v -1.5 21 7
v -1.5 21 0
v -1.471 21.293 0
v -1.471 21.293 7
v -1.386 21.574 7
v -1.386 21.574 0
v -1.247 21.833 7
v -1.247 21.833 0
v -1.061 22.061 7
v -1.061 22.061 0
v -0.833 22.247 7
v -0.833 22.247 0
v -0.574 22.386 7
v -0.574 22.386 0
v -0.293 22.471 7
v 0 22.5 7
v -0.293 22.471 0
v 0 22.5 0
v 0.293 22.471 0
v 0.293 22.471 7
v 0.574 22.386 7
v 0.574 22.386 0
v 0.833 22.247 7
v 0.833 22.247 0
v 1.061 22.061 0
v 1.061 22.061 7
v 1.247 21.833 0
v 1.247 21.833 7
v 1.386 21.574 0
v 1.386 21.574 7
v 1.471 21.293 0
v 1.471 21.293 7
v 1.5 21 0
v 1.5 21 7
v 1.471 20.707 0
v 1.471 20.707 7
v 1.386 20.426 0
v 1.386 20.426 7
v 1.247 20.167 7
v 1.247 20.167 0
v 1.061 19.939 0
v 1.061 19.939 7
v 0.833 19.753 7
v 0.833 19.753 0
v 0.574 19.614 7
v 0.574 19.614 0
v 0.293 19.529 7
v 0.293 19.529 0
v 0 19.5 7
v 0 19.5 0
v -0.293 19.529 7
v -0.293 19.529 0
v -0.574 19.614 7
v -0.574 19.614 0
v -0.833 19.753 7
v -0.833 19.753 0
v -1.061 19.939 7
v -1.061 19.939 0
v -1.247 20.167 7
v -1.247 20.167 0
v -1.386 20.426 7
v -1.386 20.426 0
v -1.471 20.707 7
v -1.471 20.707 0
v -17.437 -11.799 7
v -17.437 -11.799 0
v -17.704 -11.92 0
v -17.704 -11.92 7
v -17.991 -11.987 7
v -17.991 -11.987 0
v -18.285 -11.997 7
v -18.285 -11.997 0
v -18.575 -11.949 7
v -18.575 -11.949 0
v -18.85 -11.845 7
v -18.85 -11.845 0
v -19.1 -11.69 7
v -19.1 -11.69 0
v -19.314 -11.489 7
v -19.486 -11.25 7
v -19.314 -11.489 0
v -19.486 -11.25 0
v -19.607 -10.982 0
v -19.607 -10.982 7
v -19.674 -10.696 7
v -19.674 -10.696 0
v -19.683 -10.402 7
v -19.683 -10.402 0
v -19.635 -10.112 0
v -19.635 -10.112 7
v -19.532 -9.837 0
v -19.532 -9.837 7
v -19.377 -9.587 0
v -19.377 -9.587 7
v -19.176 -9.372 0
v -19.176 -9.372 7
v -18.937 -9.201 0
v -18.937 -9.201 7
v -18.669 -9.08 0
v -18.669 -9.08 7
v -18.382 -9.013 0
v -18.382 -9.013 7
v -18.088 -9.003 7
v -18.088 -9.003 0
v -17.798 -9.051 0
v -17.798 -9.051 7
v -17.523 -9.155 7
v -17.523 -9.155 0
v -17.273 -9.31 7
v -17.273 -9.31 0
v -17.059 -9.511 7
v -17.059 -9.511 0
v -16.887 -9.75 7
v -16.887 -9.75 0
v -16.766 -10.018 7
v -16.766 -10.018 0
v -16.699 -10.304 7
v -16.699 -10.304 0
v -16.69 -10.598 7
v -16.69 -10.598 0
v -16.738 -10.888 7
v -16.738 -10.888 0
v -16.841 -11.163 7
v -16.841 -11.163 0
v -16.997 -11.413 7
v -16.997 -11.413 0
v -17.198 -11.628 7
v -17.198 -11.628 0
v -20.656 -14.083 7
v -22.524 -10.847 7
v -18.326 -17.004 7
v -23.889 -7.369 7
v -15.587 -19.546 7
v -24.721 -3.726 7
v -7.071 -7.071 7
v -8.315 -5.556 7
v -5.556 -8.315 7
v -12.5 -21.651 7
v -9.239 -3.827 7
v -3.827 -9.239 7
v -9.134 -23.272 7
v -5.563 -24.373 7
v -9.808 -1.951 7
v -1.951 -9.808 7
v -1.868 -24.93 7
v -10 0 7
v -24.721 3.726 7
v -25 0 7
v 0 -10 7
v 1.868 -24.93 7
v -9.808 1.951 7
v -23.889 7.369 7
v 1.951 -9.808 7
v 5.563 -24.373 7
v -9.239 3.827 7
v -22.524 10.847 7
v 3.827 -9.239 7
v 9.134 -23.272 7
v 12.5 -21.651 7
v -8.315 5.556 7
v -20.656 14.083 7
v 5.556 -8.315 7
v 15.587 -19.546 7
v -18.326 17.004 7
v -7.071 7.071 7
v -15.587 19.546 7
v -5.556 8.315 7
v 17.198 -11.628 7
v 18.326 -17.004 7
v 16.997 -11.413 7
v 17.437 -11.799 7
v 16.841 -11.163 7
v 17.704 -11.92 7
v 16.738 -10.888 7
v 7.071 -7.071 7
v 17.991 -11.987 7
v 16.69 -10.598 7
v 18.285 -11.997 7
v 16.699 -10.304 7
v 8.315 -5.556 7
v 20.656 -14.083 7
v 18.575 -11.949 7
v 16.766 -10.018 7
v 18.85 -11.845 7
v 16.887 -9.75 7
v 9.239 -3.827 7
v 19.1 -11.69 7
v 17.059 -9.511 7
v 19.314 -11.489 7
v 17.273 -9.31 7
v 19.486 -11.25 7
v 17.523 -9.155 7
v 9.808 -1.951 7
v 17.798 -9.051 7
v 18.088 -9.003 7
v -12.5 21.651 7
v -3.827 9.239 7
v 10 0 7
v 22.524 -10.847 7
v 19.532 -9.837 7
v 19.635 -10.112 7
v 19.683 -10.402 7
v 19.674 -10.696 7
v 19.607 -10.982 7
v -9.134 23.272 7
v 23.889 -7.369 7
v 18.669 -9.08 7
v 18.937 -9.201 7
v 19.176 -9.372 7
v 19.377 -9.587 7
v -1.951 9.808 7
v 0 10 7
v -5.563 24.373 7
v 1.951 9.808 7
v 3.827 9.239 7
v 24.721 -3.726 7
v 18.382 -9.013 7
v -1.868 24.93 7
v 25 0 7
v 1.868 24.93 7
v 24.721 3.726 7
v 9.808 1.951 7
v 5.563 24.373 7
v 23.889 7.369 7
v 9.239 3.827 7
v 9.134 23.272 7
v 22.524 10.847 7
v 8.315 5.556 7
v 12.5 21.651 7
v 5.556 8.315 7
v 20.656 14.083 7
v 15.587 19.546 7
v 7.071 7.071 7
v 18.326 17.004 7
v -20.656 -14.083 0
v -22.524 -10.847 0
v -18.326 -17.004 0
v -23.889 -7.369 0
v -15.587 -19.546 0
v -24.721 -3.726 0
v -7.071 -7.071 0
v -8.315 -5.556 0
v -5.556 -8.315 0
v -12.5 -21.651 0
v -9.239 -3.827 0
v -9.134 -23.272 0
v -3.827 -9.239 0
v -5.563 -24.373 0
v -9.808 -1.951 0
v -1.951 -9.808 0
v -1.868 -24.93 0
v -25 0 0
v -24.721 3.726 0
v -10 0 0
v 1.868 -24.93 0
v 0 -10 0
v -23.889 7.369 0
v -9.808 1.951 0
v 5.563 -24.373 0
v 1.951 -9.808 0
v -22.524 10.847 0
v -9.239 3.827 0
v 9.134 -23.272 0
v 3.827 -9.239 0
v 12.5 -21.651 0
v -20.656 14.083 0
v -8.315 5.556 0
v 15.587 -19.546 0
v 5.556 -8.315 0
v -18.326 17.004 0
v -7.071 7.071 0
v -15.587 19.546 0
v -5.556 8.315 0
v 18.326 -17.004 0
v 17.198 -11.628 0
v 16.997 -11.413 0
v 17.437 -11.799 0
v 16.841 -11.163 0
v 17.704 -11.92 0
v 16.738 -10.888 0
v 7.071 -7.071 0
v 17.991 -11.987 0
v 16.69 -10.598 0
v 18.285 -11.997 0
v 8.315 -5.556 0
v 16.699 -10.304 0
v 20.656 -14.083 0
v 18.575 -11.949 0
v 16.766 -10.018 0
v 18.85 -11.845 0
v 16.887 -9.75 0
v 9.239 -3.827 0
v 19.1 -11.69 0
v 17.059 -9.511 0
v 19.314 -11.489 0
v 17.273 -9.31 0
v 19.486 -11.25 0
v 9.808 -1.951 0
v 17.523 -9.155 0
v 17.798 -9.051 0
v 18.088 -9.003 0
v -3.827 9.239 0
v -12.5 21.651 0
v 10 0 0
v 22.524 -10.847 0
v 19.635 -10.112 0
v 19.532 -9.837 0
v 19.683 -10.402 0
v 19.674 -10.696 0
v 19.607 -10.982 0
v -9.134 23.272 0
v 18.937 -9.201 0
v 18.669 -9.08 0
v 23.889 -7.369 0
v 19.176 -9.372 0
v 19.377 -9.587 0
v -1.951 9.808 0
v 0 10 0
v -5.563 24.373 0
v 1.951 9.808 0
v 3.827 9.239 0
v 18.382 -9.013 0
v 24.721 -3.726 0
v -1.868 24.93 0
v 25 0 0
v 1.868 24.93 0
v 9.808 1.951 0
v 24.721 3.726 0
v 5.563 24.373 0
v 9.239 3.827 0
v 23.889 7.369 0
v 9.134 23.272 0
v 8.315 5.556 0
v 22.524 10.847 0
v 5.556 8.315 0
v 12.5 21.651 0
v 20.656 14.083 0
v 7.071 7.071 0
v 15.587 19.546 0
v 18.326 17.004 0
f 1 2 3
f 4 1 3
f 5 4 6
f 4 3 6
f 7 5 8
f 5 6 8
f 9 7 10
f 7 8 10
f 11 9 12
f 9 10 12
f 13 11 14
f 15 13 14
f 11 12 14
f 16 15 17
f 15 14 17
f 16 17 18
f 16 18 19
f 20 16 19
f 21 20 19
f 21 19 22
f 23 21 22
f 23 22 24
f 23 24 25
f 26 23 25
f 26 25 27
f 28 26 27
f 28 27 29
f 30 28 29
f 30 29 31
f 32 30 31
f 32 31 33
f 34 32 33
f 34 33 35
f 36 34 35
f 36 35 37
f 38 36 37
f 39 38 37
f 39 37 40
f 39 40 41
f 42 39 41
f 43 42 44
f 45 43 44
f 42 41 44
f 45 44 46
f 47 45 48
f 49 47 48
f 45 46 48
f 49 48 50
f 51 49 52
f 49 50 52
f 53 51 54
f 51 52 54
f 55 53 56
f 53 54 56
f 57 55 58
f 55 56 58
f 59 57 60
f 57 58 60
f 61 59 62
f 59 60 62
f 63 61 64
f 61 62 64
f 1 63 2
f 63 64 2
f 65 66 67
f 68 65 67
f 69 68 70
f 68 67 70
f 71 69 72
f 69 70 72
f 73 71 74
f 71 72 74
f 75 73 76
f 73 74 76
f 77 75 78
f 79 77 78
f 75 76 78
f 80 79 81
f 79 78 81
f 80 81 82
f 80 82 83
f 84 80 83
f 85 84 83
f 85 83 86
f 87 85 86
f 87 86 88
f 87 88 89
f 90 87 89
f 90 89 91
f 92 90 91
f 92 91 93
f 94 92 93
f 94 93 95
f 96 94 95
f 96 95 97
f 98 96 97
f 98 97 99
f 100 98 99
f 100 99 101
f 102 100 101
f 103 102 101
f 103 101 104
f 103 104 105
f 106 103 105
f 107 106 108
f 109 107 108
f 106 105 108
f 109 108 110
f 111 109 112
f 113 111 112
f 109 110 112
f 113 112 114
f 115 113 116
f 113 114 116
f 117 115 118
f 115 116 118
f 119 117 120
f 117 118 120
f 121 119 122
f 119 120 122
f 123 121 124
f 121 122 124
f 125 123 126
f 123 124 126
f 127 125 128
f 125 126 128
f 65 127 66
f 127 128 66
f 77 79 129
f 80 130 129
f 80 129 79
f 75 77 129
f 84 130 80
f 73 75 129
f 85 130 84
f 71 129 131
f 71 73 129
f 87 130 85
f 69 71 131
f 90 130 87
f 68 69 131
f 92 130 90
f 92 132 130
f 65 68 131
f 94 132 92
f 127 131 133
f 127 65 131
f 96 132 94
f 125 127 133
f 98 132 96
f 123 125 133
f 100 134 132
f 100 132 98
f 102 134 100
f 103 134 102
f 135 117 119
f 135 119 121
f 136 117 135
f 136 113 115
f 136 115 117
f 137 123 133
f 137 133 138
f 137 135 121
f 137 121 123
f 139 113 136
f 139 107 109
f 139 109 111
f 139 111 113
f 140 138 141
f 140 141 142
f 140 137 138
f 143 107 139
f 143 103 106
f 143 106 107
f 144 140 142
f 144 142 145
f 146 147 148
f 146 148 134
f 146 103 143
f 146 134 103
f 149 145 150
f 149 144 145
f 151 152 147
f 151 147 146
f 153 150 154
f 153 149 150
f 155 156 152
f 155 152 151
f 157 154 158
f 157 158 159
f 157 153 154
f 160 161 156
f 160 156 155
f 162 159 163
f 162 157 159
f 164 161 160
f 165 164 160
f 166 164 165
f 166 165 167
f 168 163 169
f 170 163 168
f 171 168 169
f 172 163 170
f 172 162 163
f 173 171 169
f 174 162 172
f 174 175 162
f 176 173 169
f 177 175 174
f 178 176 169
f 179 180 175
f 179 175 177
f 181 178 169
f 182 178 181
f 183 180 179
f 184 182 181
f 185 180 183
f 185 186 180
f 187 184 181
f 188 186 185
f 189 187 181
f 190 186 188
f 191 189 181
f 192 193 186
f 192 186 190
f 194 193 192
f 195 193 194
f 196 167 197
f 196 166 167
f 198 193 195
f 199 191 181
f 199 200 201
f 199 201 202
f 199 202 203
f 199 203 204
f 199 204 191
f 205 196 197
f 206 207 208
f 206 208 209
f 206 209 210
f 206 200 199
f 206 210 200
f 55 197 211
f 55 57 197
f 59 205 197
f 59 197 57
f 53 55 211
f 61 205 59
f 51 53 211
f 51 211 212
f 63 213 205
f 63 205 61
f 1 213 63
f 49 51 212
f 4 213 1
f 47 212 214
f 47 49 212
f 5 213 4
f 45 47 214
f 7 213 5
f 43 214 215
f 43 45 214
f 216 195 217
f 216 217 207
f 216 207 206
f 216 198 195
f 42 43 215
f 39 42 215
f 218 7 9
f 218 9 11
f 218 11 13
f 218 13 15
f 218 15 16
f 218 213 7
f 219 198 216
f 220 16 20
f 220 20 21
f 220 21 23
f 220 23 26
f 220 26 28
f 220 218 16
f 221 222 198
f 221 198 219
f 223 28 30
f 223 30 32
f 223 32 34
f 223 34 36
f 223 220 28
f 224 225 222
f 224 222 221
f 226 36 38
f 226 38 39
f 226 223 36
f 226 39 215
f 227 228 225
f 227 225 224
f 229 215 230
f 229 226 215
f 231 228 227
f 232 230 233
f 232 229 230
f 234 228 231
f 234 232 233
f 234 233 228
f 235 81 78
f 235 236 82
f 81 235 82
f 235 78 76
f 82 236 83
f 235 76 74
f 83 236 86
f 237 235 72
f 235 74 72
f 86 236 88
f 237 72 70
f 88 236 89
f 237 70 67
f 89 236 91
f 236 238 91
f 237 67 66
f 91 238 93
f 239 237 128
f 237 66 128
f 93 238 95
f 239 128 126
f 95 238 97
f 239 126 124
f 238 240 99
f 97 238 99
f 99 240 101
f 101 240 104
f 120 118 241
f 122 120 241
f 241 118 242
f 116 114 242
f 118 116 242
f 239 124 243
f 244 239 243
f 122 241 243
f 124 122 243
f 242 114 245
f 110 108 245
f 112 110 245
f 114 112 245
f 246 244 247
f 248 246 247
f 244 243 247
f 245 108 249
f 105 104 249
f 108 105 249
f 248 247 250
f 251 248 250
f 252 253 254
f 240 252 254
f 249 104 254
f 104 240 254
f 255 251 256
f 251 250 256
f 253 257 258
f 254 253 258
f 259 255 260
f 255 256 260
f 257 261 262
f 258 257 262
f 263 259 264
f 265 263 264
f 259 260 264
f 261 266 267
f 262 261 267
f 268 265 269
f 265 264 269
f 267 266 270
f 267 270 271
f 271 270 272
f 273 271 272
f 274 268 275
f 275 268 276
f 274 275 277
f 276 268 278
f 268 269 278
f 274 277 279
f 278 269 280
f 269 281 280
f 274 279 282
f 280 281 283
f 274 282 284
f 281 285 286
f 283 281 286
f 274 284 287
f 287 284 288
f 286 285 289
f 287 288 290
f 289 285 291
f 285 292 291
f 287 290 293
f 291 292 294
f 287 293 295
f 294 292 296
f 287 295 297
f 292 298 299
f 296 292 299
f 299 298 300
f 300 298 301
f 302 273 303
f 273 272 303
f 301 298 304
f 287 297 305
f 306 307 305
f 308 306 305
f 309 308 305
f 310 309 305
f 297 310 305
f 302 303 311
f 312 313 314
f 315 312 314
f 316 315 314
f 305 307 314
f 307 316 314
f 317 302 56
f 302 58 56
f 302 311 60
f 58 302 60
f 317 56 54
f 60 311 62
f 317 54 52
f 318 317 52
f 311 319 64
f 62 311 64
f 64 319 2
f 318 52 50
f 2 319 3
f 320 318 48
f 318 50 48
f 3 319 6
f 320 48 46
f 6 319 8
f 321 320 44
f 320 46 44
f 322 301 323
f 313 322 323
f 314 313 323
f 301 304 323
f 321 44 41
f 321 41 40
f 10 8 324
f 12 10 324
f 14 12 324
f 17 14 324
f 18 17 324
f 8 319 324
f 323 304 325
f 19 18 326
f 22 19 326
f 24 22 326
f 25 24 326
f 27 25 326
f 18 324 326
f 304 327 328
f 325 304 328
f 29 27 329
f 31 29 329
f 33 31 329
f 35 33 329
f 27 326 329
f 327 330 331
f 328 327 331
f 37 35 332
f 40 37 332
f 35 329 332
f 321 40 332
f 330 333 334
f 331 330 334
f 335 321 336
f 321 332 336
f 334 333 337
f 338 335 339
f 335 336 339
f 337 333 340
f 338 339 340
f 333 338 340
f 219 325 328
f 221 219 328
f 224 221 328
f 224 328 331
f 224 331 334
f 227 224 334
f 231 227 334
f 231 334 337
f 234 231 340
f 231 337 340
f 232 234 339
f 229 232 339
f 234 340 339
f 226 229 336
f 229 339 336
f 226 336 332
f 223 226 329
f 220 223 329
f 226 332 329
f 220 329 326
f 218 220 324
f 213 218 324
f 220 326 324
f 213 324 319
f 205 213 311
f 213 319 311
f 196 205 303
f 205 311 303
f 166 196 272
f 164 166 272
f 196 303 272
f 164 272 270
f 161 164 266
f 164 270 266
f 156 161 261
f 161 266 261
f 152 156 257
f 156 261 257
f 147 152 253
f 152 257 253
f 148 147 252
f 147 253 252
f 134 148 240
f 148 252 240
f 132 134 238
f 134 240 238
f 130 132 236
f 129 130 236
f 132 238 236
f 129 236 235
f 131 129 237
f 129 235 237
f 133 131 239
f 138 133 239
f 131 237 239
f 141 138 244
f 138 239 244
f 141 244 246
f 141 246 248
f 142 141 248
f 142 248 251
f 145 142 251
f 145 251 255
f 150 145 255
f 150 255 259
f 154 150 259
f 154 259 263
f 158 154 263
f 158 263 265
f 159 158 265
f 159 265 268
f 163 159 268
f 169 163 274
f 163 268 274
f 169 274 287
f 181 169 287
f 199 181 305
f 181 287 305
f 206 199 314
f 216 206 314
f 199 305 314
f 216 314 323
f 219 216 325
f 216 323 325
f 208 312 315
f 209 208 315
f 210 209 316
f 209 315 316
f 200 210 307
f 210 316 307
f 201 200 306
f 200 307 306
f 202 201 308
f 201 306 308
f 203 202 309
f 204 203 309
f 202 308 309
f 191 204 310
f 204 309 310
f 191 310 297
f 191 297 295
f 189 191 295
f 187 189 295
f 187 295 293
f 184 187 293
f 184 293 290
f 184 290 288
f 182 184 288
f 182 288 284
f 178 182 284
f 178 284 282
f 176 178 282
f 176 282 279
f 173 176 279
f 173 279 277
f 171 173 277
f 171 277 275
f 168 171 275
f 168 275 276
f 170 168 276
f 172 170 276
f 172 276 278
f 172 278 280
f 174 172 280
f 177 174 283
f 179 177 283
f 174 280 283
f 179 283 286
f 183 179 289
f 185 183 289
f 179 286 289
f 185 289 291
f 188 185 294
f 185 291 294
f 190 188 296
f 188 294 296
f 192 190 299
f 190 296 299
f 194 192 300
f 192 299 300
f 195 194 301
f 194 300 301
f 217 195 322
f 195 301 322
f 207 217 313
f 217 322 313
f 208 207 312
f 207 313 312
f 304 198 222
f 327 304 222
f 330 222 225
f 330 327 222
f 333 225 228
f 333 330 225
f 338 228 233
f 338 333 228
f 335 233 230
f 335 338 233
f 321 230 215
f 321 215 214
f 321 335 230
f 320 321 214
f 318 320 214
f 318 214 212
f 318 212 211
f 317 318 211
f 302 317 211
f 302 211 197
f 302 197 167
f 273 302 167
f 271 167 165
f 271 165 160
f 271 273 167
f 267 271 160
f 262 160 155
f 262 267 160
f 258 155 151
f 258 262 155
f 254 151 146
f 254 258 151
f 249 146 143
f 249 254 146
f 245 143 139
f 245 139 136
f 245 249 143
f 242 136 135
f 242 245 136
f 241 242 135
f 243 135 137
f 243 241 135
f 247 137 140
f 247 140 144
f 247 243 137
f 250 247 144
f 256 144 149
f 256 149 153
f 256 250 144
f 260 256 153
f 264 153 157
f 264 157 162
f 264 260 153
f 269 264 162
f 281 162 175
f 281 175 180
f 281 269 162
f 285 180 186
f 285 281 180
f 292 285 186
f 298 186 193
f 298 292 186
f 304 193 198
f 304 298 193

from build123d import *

# Parameters (mm, degrees)
SKETCH1_R             = 25
SKETCH1_R_2           = 10
BOSS_EXTRUDE2_DEPTH   = 7
F_3_0MM_DOWEL_HOLE1_D = 3
CIRPATTERN1_COUNT     = 3


with BuildPart() as part:
    # Sketch1 → Boss-Extrude2 (new body)
    with BuildSketch(Plane.XY):
        Circle(SKETCH1_R)
        Circle(SKETCH1_R_2, mode=Mode.SUBTRACT)
    extrude(amount=BOSS_EXTRUDE2_DEPTH)

    # Ø3.0mm Dowel Hole1 (through all)
    with Locations(Plane.XY.offset(7)):
        with Locations((0, 21)):
            f_3_0mm_dowel_hole1 = Hole(F_3_0MM_DOWEL_HOLE1_D / 2)

    # CirPattern1: Ø3.0mm Dowel Hole1 ×3 about axis
    cirpattern1_axis = Axis((0, 0, 0), (0, 0, 1))
    for i in range(1, CIRPATTERN1_COUNT):
        add(f_3_0mm_dowel_hole1.rotate(cirpattern1_axis, i * 360 / CIRPATTERN1_COUNT), mode=Mode.SUBTRACT)


solid = part.part
